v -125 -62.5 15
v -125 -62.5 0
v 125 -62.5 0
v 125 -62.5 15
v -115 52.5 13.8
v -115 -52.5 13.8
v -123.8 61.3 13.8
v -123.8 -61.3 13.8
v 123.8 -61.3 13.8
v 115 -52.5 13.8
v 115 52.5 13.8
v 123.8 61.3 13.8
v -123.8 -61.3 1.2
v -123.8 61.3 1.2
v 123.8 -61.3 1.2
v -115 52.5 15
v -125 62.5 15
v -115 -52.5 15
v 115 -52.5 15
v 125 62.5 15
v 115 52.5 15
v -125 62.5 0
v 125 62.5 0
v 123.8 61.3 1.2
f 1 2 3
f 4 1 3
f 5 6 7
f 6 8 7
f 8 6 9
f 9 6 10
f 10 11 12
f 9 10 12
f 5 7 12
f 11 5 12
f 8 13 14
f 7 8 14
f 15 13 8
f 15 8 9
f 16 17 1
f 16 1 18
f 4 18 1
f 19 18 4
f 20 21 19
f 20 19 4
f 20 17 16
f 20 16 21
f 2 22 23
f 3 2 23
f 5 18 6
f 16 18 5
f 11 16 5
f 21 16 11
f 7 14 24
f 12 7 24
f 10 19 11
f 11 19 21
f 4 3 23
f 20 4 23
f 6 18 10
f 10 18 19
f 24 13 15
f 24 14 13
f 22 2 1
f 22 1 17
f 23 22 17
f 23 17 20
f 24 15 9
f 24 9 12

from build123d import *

# Parameters (mm, degrees)
SKETCH_1_W          = 250
SKETCH_1_H          = 125
EXTRUDE_1_DEPTH     = 15
SHELL_1_T           = 1.2
CUT_EXTRUDE_1_REACH = 142.557
SKETCH_3_W          = 230
SKETCH_3_H          = 105


with BuildPart() as part:
    # 草图1 → 凸台-拉伸1 (new body)
    with BuildSketch(Plane.XY):
        Rectangle(SKETCH_1_W, SKETCH_1_H)
    extrude(amount=EXTRUDE_1_DEPTH)

    # 抽壳1 (no face opened: a closed hollow body)
    add(offset(amount=-SHELL_1_T, mode=Mode.PRIVATE), mode=Mode.SUBTRACT)

    # 草图3 → 切除-拉伸1 (cut, up to next)
    with BuildSketch(Plane.XY.offset(15), mode=Mode.PRIVATE) as cut_extrude_1_sk1:
        Rectangle(SKETCH_3_W, SKETCH_3_H)
    cut_extrude_1_tool1 = extrude(cut_extrude_1_sk1.sketch, amount=-CUT_EXTRUDE_1_REACH, mode=Mode.PRIVATE) & part.part
    add(cut_extrude_1_tool1.solids().sort_by_distance((0, 0, 15))[0], mode=Mode.SUBTRACT)


solid = part.part
